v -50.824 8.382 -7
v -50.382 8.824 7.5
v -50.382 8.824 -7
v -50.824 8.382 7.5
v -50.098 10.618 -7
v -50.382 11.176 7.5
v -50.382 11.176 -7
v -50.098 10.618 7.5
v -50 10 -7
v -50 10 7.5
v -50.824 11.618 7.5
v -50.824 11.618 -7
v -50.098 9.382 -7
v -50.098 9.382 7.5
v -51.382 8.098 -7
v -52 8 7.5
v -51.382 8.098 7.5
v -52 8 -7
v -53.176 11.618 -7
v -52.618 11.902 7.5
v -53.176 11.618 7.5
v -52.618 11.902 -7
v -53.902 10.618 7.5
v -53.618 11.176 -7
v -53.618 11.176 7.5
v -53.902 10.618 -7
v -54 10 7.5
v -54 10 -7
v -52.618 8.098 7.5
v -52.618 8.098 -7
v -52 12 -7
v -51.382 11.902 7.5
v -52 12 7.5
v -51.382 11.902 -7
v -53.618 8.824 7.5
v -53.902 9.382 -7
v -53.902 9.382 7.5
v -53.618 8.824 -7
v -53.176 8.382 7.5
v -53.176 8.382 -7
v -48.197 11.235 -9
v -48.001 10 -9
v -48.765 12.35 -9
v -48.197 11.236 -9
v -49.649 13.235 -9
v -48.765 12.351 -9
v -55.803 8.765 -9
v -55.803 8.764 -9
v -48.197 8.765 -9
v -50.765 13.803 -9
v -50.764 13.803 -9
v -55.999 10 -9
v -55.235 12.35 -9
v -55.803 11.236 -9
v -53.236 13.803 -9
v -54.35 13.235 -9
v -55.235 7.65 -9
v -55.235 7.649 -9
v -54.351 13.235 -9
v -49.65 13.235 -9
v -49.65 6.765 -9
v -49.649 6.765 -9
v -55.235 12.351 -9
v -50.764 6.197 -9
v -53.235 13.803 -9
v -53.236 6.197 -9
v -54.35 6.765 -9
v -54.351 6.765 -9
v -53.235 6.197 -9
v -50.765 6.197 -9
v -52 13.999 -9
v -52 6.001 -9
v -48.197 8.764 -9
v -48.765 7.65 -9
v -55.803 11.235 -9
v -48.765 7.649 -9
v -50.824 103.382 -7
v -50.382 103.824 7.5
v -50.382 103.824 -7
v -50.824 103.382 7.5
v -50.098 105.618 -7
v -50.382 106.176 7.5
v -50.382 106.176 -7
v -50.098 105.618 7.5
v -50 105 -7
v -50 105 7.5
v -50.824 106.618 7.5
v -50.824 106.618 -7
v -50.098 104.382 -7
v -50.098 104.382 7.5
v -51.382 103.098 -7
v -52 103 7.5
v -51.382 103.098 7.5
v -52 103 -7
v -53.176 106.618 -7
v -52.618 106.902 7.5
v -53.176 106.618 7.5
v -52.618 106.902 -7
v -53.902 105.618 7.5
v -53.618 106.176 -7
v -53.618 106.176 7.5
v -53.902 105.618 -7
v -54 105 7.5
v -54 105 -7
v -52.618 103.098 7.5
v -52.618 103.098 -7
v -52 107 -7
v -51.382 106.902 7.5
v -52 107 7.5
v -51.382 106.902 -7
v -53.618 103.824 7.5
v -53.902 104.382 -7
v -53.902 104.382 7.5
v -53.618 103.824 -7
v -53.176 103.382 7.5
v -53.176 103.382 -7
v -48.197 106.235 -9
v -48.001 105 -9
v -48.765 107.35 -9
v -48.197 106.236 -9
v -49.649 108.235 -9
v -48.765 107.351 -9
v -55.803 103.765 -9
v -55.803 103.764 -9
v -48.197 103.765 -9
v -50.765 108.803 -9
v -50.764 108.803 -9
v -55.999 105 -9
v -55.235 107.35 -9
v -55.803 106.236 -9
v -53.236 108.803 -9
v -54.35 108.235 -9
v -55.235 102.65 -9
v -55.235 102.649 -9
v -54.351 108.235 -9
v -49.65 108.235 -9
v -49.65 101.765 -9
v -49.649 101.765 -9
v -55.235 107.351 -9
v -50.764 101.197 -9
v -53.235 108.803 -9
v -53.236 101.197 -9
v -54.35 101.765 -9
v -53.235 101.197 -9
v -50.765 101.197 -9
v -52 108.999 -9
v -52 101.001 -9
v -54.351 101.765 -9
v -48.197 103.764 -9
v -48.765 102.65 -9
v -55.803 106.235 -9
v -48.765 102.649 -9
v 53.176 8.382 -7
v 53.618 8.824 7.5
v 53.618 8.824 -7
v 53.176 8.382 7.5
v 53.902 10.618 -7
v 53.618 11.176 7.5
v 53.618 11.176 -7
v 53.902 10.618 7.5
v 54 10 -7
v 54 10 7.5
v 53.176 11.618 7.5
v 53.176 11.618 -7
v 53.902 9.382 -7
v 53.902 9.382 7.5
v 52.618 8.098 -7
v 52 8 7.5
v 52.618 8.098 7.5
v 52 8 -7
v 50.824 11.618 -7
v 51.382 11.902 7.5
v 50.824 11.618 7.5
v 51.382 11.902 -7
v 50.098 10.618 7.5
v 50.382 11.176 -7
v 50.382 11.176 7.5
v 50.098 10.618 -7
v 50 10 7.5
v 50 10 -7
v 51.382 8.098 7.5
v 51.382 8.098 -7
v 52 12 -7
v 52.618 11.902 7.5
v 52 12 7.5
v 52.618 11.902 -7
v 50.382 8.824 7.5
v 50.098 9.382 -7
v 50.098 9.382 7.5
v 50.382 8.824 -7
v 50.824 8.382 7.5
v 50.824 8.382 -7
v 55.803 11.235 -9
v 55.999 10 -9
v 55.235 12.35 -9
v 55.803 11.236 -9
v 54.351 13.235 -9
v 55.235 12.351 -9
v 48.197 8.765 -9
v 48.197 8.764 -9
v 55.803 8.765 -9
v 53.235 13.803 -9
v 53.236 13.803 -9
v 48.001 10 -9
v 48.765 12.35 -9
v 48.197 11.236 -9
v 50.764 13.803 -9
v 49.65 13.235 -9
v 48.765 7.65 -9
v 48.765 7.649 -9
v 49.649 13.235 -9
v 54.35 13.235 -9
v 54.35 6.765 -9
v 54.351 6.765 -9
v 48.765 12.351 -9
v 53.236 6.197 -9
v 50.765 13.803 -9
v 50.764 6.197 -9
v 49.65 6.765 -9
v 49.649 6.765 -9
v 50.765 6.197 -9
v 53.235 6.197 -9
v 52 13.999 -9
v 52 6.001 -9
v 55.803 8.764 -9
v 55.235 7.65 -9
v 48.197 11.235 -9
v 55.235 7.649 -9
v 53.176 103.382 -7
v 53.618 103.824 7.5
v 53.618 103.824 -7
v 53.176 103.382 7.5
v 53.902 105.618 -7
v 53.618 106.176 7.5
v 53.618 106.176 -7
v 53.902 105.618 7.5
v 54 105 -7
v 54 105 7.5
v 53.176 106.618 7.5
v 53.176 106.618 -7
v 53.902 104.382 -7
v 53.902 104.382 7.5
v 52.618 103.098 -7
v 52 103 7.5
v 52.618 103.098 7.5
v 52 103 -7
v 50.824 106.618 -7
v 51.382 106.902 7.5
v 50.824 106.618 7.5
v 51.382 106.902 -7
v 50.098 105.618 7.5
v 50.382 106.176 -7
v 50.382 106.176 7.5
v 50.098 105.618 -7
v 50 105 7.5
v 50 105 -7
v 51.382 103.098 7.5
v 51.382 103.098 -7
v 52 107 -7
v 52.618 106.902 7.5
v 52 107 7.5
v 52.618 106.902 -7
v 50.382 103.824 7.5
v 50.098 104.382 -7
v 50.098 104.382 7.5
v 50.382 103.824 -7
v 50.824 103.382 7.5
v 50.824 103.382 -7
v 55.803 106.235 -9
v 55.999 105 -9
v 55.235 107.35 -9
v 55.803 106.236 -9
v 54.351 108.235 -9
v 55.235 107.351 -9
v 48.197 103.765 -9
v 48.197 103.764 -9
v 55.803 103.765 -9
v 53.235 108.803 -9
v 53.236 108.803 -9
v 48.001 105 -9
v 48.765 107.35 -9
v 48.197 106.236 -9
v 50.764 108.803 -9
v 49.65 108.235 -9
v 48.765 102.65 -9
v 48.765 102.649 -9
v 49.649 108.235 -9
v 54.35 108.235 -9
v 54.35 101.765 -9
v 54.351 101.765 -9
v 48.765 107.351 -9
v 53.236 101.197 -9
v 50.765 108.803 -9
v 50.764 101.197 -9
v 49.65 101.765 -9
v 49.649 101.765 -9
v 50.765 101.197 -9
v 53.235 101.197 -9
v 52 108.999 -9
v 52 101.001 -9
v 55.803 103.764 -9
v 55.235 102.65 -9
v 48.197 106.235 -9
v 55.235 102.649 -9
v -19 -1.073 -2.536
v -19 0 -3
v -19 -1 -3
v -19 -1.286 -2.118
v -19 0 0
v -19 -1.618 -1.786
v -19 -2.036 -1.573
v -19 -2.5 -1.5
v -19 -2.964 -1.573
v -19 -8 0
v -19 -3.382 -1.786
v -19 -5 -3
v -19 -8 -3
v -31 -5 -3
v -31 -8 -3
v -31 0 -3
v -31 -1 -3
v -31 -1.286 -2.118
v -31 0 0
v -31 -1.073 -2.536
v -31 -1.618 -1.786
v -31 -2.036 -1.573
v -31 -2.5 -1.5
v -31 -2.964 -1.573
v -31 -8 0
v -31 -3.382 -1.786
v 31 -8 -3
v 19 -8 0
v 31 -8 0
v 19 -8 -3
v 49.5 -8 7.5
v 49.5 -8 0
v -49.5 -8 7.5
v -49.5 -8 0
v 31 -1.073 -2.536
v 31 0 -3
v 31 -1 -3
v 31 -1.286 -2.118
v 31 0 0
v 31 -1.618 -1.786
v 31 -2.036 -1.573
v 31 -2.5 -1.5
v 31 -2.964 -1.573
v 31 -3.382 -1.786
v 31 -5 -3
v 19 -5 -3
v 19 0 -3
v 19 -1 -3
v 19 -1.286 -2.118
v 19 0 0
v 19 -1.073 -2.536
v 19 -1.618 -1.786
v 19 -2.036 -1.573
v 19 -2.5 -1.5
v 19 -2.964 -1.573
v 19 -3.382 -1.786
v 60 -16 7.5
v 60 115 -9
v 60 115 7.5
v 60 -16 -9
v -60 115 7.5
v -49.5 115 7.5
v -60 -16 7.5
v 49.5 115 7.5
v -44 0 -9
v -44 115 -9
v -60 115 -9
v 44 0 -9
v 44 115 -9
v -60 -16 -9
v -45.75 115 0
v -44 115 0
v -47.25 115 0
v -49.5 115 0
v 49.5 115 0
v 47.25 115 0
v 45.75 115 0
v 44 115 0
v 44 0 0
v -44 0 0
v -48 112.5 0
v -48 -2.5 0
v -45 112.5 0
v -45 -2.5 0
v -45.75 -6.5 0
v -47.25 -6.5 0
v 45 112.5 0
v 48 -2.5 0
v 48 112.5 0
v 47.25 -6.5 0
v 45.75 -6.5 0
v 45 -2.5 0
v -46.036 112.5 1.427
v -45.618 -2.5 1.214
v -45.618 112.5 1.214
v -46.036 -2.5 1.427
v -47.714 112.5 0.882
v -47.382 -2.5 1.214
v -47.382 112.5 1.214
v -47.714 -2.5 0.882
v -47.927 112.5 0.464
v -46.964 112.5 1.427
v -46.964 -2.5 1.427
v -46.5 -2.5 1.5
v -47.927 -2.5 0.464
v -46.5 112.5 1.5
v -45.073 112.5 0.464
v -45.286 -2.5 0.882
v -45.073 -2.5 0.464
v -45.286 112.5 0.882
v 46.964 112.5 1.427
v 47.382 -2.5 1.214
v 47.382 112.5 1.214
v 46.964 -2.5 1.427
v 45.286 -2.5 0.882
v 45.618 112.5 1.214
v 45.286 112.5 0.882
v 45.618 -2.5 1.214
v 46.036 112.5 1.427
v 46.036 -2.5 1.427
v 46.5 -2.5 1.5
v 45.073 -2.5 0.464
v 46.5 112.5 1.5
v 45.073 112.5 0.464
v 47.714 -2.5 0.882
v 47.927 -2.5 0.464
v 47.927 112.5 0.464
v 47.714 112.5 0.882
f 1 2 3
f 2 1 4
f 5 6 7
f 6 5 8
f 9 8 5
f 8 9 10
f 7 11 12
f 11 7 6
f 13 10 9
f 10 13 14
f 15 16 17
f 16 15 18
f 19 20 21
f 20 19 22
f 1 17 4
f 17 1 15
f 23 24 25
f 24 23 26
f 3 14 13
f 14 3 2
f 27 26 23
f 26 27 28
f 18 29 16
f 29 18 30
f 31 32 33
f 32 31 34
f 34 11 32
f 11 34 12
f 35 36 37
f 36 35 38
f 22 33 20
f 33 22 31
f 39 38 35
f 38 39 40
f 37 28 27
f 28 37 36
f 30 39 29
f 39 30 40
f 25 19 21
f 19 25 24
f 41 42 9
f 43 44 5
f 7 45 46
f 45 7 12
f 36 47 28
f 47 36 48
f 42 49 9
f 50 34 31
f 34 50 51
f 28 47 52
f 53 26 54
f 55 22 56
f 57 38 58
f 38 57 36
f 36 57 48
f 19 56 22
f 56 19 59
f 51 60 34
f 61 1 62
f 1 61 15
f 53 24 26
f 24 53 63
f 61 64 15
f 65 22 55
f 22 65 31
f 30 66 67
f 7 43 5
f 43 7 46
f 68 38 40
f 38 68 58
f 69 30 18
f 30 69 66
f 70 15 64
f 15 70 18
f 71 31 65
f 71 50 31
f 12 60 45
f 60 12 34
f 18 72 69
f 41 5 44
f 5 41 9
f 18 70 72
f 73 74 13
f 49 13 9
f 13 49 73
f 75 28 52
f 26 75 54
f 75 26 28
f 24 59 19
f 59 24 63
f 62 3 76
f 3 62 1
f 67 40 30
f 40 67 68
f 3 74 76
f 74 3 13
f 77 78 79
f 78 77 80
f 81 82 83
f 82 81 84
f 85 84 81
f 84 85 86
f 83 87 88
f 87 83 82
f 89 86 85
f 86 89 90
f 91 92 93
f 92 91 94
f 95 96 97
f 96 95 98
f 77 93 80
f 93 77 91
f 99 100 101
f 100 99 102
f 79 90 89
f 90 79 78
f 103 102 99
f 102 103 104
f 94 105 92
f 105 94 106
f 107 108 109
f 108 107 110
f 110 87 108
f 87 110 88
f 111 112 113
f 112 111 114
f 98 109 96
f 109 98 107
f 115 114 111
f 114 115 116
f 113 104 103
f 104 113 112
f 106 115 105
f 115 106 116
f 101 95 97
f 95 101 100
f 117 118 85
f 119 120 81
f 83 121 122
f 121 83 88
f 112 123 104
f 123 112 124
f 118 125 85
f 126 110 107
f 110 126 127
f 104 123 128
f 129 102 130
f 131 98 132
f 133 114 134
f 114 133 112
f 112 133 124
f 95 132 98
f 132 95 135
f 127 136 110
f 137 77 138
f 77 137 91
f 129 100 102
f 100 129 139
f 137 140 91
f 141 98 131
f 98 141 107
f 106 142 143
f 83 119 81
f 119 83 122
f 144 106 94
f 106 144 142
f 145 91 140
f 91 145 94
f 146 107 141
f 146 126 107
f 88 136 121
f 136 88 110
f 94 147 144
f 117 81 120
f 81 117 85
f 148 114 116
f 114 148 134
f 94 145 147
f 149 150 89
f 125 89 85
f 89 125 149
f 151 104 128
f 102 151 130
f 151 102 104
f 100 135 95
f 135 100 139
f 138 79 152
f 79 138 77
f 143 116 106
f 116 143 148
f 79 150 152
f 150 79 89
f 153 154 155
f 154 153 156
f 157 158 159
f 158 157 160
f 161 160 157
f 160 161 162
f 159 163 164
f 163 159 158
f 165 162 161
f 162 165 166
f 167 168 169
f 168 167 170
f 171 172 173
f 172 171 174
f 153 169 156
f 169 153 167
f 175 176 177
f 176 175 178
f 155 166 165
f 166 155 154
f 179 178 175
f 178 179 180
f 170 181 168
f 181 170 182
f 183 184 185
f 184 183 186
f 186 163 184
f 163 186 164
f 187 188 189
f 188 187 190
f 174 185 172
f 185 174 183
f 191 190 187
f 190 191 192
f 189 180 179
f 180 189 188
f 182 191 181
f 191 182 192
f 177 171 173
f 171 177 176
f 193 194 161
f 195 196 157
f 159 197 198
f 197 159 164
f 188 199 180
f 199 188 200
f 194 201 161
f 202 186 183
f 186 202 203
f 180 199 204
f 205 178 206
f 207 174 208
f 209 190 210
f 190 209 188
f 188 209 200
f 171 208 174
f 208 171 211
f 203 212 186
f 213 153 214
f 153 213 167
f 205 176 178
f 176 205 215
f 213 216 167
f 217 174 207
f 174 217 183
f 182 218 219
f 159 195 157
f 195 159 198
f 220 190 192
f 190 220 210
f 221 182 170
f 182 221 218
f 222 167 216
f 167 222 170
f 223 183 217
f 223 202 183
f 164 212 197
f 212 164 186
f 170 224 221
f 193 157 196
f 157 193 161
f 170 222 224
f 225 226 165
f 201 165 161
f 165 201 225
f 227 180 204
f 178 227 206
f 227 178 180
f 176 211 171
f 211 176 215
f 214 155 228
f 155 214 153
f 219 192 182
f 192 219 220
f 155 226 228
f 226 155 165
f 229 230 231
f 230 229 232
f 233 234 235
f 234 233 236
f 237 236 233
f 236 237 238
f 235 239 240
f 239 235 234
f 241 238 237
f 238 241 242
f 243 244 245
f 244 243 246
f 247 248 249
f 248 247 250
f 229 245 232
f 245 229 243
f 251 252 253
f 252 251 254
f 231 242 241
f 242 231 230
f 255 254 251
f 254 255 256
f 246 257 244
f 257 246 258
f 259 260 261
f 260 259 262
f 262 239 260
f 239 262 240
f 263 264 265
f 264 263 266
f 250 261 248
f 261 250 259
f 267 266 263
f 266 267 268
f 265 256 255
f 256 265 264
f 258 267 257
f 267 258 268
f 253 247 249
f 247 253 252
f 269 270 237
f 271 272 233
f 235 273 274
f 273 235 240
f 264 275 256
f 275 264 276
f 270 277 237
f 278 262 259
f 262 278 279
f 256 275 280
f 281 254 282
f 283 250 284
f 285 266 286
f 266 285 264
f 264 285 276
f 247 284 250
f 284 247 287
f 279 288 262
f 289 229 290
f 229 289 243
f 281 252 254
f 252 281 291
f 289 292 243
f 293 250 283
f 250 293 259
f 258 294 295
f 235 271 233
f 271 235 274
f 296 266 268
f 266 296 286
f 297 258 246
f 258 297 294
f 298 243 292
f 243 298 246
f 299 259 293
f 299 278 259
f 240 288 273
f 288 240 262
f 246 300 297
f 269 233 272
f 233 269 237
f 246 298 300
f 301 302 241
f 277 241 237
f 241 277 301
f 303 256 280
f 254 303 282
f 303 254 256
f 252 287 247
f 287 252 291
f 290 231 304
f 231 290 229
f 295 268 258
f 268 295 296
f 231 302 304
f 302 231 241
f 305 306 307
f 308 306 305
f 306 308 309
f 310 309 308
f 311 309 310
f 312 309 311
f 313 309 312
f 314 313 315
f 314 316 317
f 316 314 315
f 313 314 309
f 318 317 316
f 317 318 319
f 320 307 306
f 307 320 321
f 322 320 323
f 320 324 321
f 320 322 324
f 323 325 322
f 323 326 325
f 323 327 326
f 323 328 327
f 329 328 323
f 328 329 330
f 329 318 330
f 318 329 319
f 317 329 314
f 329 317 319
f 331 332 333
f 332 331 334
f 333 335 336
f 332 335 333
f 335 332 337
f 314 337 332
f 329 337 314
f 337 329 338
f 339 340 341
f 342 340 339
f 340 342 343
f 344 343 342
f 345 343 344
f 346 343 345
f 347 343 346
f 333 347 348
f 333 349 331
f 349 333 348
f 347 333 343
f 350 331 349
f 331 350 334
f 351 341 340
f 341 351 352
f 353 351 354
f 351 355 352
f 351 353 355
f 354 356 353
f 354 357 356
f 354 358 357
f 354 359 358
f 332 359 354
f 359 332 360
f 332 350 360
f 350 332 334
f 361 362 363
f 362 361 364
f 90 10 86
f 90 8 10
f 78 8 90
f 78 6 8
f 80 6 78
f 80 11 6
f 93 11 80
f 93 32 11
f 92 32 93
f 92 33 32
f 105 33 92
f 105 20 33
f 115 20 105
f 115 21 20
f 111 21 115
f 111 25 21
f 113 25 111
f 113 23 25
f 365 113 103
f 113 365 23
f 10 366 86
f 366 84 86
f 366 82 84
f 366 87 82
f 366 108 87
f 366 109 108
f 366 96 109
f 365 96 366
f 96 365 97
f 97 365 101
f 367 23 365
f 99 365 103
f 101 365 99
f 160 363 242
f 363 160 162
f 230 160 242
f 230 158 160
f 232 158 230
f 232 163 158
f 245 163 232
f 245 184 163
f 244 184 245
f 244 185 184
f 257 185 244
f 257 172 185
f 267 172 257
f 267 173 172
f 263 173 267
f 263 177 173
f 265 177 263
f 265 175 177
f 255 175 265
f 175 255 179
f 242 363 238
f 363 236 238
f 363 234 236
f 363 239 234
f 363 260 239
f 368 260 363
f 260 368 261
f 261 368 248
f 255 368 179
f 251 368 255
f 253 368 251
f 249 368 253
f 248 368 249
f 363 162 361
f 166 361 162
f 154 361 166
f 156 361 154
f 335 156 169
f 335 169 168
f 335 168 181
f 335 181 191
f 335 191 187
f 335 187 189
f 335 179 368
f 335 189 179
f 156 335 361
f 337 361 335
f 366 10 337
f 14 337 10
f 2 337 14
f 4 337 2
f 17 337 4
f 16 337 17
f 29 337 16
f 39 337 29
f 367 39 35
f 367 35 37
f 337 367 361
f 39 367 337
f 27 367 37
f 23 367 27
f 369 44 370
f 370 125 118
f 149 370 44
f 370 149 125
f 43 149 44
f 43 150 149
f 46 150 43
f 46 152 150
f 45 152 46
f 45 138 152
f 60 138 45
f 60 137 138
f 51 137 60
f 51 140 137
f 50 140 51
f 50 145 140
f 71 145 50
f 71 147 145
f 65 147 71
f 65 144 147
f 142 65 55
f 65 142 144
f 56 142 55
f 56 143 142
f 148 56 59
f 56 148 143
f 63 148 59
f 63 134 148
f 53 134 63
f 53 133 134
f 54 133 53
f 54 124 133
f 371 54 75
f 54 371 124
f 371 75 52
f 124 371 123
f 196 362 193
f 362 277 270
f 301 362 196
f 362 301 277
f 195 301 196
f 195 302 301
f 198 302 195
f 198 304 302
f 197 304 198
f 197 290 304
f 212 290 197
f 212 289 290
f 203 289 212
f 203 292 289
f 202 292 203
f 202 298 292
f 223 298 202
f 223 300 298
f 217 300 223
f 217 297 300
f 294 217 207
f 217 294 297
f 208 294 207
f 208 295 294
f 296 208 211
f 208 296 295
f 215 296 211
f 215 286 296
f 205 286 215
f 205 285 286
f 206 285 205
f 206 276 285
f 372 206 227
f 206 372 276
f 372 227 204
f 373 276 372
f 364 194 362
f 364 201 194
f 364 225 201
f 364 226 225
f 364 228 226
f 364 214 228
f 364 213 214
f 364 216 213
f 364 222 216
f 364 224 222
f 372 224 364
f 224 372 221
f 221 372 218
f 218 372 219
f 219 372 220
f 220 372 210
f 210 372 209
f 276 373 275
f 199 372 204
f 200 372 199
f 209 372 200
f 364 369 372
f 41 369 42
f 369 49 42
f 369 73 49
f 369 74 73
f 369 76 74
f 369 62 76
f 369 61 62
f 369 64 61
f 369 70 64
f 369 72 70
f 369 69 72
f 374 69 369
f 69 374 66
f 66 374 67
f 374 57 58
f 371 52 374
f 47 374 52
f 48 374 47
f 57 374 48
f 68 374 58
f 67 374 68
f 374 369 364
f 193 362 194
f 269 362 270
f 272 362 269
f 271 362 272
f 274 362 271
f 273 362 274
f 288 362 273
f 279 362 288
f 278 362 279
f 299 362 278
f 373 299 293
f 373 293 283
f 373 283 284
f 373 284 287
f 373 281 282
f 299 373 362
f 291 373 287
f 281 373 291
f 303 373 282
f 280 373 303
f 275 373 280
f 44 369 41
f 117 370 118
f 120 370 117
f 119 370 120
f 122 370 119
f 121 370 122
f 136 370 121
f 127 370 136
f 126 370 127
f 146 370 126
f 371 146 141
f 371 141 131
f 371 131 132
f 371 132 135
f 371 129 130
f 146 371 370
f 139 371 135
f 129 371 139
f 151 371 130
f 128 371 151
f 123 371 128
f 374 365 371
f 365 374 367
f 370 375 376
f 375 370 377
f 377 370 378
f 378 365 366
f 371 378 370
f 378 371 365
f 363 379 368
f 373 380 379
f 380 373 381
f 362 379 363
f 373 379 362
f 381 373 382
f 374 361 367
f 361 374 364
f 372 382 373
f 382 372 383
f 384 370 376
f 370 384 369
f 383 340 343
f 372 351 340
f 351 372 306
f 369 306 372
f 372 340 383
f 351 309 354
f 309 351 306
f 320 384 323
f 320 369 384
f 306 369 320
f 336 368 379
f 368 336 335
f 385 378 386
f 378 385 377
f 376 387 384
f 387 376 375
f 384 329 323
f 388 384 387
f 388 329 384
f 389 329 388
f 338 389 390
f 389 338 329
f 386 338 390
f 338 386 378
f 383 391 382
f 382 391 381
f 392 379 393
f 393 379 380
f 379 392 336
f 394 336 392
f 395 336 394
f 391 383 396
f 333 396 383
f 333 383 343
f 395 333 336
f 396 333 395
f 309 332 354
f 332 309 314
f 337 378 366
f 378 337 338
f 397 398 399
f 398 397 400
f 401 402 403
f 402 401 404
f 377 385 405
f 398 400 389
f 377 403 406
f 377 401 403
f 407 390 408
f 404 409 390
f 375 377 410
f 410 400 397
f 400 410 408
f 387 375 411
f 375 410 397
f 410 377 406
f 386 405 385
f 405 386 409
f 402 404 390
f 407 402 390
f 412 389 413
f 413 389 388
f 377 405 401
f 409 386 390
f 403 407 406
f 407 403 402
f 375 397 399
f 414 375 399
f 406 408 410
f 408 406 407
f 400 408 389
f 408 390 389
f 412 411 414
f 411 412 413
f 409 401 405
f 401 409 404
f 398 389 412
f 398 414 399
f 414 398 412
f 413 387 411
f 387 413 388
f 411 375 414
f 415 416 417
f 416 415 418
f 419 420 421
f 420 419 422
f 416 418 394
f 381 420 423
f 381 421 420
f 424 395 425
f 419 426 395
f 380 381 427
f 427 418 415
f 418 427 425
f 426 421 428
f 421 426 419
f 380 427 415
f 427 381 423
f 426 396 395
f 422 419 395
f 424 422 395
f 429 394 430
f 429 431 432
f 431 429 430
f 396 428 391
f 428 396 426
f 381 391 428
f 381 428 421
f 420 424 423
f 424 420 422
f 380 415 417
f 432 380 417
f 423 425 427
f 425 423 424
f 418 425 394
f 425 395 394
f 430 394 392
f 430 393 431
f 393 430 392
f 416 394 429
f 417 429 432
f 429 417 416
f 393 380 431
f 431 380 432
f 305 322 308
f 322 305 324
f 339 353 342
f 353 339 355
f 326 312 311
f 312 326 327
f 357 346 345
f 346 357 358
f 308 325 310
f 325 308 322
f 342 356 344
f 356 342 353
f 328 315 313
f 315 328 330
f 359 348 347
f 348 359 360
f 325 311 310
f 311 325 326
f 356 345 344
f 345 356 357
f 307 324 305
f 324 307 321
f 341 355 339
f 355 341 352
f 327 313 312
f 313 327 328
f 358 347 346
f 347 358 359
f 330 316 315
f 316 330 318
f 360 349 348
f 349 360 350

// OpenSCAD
// Measured
BODY_W = 88;
BODY_L = 115;
RIM_W = 5;
RIM_L = 8;
RIM_H = 6;
PLASTIC_T = 1;
BACK_W = 11;
BACK_SEP = 39;
BACK_H = 3;
OVERALL_H = 15; // from screw
SCREW_R = 4/2;
SCREW_R_HEAD = 8/2;

// Calc
BASE_H = OVERALL_H - RIM_H;

// Mine
BASE_W = 11;
BASE_L = 8;
SCREW_POS = 10;


// Misc
EPS = 0.001;
TOL = 0.5;

module box (sizes, centering=[1, 1, 1], extra_negative=[0, 0, 0]) {
    translate ([
        -sizes[0]*centering[0]/2-extra_negative[0],
        -sizes[1]*centering[1]/2-extra_negative[1],
        -sizes[2]*centering[2]/2-extra_negative[2],
    ]) {
        cube ([
            sizes[0]+extra_negative[0],
            sizes[1]+extra_negative[1],
            sizes[2]+extra_negative[2],
        ]);
    }
}

union () {
    R=RIM_W/2-PLASTIC_T;
    difference () {
        box ([BODY_W+RIM_W*2+BASE_W*2, BODY_L, RIM_H+R], [1, 0, 0], [0, RIM_L+BASE_L, BASE_H]);
        box ([BODY_W, BODY_L+EPS, 1000], [1, 0, 1]);
        box ([BODY_W+RIM_W*2+TOL*2, BODY_L+EPS, 1000], [1, 0, 0], [0, RIM_L, 0]);
        for (x=[-1,1]) {
            // gaps in the back
            translate ([x*(BACK_SEP/2+BACK_W/2), 0, 0]) box ([BACK_W+TOL*2, 1000, 1000], [1, 0, 0], [0, RIM_L, BACK_H]);
            // screw holes
            for (y=[SCREW_POS, BODY_L-SCREW_POS]) {
                translate ([x*(BODY_W/2+RIM_W/2+BASE_W/2), y, -BASE_H-EPS]) {
                    cylinder (1000, r=SCREW_R, $fn=20);
                    cylinder (SCREW_R_HEAD-SCREW_R+EPS, r1=SCREW_R_HEAD, r2=SCREW_R, $fn=20);
                }
            }
        }
    }
    for (x=[-1,1]) {
        B = R+PLASTIC_T;
        hull () {
            translate ([x*(BODY_W/2+RIM_W/2), -B, 0]) rotate ([-90, 0, 0]) {
                cylinder (BODY_L, r=R, $fn=20);
            }
            translate ([x*(BODY_W/2+RIM_W/2), 0, 0]) box ([R, BODY_L, 0], [1, 0, 0], [0, RIM_L/2+B, EPS]);
        }
    }
    hull () {
        translate ([-BODY_W/2, -R-PLASTIC_T, -BACK_H]) rotate ([0, 90, 0]) cylinder (BODY_W, r=R, $fn=20);
        translate ([0, -R-PLASTIC_T, -BACK_H]) box ([BODY_W, (R)*2, 0], [1, 1, 0], [0, PLASTIC_T, EPS]);
    }
}
